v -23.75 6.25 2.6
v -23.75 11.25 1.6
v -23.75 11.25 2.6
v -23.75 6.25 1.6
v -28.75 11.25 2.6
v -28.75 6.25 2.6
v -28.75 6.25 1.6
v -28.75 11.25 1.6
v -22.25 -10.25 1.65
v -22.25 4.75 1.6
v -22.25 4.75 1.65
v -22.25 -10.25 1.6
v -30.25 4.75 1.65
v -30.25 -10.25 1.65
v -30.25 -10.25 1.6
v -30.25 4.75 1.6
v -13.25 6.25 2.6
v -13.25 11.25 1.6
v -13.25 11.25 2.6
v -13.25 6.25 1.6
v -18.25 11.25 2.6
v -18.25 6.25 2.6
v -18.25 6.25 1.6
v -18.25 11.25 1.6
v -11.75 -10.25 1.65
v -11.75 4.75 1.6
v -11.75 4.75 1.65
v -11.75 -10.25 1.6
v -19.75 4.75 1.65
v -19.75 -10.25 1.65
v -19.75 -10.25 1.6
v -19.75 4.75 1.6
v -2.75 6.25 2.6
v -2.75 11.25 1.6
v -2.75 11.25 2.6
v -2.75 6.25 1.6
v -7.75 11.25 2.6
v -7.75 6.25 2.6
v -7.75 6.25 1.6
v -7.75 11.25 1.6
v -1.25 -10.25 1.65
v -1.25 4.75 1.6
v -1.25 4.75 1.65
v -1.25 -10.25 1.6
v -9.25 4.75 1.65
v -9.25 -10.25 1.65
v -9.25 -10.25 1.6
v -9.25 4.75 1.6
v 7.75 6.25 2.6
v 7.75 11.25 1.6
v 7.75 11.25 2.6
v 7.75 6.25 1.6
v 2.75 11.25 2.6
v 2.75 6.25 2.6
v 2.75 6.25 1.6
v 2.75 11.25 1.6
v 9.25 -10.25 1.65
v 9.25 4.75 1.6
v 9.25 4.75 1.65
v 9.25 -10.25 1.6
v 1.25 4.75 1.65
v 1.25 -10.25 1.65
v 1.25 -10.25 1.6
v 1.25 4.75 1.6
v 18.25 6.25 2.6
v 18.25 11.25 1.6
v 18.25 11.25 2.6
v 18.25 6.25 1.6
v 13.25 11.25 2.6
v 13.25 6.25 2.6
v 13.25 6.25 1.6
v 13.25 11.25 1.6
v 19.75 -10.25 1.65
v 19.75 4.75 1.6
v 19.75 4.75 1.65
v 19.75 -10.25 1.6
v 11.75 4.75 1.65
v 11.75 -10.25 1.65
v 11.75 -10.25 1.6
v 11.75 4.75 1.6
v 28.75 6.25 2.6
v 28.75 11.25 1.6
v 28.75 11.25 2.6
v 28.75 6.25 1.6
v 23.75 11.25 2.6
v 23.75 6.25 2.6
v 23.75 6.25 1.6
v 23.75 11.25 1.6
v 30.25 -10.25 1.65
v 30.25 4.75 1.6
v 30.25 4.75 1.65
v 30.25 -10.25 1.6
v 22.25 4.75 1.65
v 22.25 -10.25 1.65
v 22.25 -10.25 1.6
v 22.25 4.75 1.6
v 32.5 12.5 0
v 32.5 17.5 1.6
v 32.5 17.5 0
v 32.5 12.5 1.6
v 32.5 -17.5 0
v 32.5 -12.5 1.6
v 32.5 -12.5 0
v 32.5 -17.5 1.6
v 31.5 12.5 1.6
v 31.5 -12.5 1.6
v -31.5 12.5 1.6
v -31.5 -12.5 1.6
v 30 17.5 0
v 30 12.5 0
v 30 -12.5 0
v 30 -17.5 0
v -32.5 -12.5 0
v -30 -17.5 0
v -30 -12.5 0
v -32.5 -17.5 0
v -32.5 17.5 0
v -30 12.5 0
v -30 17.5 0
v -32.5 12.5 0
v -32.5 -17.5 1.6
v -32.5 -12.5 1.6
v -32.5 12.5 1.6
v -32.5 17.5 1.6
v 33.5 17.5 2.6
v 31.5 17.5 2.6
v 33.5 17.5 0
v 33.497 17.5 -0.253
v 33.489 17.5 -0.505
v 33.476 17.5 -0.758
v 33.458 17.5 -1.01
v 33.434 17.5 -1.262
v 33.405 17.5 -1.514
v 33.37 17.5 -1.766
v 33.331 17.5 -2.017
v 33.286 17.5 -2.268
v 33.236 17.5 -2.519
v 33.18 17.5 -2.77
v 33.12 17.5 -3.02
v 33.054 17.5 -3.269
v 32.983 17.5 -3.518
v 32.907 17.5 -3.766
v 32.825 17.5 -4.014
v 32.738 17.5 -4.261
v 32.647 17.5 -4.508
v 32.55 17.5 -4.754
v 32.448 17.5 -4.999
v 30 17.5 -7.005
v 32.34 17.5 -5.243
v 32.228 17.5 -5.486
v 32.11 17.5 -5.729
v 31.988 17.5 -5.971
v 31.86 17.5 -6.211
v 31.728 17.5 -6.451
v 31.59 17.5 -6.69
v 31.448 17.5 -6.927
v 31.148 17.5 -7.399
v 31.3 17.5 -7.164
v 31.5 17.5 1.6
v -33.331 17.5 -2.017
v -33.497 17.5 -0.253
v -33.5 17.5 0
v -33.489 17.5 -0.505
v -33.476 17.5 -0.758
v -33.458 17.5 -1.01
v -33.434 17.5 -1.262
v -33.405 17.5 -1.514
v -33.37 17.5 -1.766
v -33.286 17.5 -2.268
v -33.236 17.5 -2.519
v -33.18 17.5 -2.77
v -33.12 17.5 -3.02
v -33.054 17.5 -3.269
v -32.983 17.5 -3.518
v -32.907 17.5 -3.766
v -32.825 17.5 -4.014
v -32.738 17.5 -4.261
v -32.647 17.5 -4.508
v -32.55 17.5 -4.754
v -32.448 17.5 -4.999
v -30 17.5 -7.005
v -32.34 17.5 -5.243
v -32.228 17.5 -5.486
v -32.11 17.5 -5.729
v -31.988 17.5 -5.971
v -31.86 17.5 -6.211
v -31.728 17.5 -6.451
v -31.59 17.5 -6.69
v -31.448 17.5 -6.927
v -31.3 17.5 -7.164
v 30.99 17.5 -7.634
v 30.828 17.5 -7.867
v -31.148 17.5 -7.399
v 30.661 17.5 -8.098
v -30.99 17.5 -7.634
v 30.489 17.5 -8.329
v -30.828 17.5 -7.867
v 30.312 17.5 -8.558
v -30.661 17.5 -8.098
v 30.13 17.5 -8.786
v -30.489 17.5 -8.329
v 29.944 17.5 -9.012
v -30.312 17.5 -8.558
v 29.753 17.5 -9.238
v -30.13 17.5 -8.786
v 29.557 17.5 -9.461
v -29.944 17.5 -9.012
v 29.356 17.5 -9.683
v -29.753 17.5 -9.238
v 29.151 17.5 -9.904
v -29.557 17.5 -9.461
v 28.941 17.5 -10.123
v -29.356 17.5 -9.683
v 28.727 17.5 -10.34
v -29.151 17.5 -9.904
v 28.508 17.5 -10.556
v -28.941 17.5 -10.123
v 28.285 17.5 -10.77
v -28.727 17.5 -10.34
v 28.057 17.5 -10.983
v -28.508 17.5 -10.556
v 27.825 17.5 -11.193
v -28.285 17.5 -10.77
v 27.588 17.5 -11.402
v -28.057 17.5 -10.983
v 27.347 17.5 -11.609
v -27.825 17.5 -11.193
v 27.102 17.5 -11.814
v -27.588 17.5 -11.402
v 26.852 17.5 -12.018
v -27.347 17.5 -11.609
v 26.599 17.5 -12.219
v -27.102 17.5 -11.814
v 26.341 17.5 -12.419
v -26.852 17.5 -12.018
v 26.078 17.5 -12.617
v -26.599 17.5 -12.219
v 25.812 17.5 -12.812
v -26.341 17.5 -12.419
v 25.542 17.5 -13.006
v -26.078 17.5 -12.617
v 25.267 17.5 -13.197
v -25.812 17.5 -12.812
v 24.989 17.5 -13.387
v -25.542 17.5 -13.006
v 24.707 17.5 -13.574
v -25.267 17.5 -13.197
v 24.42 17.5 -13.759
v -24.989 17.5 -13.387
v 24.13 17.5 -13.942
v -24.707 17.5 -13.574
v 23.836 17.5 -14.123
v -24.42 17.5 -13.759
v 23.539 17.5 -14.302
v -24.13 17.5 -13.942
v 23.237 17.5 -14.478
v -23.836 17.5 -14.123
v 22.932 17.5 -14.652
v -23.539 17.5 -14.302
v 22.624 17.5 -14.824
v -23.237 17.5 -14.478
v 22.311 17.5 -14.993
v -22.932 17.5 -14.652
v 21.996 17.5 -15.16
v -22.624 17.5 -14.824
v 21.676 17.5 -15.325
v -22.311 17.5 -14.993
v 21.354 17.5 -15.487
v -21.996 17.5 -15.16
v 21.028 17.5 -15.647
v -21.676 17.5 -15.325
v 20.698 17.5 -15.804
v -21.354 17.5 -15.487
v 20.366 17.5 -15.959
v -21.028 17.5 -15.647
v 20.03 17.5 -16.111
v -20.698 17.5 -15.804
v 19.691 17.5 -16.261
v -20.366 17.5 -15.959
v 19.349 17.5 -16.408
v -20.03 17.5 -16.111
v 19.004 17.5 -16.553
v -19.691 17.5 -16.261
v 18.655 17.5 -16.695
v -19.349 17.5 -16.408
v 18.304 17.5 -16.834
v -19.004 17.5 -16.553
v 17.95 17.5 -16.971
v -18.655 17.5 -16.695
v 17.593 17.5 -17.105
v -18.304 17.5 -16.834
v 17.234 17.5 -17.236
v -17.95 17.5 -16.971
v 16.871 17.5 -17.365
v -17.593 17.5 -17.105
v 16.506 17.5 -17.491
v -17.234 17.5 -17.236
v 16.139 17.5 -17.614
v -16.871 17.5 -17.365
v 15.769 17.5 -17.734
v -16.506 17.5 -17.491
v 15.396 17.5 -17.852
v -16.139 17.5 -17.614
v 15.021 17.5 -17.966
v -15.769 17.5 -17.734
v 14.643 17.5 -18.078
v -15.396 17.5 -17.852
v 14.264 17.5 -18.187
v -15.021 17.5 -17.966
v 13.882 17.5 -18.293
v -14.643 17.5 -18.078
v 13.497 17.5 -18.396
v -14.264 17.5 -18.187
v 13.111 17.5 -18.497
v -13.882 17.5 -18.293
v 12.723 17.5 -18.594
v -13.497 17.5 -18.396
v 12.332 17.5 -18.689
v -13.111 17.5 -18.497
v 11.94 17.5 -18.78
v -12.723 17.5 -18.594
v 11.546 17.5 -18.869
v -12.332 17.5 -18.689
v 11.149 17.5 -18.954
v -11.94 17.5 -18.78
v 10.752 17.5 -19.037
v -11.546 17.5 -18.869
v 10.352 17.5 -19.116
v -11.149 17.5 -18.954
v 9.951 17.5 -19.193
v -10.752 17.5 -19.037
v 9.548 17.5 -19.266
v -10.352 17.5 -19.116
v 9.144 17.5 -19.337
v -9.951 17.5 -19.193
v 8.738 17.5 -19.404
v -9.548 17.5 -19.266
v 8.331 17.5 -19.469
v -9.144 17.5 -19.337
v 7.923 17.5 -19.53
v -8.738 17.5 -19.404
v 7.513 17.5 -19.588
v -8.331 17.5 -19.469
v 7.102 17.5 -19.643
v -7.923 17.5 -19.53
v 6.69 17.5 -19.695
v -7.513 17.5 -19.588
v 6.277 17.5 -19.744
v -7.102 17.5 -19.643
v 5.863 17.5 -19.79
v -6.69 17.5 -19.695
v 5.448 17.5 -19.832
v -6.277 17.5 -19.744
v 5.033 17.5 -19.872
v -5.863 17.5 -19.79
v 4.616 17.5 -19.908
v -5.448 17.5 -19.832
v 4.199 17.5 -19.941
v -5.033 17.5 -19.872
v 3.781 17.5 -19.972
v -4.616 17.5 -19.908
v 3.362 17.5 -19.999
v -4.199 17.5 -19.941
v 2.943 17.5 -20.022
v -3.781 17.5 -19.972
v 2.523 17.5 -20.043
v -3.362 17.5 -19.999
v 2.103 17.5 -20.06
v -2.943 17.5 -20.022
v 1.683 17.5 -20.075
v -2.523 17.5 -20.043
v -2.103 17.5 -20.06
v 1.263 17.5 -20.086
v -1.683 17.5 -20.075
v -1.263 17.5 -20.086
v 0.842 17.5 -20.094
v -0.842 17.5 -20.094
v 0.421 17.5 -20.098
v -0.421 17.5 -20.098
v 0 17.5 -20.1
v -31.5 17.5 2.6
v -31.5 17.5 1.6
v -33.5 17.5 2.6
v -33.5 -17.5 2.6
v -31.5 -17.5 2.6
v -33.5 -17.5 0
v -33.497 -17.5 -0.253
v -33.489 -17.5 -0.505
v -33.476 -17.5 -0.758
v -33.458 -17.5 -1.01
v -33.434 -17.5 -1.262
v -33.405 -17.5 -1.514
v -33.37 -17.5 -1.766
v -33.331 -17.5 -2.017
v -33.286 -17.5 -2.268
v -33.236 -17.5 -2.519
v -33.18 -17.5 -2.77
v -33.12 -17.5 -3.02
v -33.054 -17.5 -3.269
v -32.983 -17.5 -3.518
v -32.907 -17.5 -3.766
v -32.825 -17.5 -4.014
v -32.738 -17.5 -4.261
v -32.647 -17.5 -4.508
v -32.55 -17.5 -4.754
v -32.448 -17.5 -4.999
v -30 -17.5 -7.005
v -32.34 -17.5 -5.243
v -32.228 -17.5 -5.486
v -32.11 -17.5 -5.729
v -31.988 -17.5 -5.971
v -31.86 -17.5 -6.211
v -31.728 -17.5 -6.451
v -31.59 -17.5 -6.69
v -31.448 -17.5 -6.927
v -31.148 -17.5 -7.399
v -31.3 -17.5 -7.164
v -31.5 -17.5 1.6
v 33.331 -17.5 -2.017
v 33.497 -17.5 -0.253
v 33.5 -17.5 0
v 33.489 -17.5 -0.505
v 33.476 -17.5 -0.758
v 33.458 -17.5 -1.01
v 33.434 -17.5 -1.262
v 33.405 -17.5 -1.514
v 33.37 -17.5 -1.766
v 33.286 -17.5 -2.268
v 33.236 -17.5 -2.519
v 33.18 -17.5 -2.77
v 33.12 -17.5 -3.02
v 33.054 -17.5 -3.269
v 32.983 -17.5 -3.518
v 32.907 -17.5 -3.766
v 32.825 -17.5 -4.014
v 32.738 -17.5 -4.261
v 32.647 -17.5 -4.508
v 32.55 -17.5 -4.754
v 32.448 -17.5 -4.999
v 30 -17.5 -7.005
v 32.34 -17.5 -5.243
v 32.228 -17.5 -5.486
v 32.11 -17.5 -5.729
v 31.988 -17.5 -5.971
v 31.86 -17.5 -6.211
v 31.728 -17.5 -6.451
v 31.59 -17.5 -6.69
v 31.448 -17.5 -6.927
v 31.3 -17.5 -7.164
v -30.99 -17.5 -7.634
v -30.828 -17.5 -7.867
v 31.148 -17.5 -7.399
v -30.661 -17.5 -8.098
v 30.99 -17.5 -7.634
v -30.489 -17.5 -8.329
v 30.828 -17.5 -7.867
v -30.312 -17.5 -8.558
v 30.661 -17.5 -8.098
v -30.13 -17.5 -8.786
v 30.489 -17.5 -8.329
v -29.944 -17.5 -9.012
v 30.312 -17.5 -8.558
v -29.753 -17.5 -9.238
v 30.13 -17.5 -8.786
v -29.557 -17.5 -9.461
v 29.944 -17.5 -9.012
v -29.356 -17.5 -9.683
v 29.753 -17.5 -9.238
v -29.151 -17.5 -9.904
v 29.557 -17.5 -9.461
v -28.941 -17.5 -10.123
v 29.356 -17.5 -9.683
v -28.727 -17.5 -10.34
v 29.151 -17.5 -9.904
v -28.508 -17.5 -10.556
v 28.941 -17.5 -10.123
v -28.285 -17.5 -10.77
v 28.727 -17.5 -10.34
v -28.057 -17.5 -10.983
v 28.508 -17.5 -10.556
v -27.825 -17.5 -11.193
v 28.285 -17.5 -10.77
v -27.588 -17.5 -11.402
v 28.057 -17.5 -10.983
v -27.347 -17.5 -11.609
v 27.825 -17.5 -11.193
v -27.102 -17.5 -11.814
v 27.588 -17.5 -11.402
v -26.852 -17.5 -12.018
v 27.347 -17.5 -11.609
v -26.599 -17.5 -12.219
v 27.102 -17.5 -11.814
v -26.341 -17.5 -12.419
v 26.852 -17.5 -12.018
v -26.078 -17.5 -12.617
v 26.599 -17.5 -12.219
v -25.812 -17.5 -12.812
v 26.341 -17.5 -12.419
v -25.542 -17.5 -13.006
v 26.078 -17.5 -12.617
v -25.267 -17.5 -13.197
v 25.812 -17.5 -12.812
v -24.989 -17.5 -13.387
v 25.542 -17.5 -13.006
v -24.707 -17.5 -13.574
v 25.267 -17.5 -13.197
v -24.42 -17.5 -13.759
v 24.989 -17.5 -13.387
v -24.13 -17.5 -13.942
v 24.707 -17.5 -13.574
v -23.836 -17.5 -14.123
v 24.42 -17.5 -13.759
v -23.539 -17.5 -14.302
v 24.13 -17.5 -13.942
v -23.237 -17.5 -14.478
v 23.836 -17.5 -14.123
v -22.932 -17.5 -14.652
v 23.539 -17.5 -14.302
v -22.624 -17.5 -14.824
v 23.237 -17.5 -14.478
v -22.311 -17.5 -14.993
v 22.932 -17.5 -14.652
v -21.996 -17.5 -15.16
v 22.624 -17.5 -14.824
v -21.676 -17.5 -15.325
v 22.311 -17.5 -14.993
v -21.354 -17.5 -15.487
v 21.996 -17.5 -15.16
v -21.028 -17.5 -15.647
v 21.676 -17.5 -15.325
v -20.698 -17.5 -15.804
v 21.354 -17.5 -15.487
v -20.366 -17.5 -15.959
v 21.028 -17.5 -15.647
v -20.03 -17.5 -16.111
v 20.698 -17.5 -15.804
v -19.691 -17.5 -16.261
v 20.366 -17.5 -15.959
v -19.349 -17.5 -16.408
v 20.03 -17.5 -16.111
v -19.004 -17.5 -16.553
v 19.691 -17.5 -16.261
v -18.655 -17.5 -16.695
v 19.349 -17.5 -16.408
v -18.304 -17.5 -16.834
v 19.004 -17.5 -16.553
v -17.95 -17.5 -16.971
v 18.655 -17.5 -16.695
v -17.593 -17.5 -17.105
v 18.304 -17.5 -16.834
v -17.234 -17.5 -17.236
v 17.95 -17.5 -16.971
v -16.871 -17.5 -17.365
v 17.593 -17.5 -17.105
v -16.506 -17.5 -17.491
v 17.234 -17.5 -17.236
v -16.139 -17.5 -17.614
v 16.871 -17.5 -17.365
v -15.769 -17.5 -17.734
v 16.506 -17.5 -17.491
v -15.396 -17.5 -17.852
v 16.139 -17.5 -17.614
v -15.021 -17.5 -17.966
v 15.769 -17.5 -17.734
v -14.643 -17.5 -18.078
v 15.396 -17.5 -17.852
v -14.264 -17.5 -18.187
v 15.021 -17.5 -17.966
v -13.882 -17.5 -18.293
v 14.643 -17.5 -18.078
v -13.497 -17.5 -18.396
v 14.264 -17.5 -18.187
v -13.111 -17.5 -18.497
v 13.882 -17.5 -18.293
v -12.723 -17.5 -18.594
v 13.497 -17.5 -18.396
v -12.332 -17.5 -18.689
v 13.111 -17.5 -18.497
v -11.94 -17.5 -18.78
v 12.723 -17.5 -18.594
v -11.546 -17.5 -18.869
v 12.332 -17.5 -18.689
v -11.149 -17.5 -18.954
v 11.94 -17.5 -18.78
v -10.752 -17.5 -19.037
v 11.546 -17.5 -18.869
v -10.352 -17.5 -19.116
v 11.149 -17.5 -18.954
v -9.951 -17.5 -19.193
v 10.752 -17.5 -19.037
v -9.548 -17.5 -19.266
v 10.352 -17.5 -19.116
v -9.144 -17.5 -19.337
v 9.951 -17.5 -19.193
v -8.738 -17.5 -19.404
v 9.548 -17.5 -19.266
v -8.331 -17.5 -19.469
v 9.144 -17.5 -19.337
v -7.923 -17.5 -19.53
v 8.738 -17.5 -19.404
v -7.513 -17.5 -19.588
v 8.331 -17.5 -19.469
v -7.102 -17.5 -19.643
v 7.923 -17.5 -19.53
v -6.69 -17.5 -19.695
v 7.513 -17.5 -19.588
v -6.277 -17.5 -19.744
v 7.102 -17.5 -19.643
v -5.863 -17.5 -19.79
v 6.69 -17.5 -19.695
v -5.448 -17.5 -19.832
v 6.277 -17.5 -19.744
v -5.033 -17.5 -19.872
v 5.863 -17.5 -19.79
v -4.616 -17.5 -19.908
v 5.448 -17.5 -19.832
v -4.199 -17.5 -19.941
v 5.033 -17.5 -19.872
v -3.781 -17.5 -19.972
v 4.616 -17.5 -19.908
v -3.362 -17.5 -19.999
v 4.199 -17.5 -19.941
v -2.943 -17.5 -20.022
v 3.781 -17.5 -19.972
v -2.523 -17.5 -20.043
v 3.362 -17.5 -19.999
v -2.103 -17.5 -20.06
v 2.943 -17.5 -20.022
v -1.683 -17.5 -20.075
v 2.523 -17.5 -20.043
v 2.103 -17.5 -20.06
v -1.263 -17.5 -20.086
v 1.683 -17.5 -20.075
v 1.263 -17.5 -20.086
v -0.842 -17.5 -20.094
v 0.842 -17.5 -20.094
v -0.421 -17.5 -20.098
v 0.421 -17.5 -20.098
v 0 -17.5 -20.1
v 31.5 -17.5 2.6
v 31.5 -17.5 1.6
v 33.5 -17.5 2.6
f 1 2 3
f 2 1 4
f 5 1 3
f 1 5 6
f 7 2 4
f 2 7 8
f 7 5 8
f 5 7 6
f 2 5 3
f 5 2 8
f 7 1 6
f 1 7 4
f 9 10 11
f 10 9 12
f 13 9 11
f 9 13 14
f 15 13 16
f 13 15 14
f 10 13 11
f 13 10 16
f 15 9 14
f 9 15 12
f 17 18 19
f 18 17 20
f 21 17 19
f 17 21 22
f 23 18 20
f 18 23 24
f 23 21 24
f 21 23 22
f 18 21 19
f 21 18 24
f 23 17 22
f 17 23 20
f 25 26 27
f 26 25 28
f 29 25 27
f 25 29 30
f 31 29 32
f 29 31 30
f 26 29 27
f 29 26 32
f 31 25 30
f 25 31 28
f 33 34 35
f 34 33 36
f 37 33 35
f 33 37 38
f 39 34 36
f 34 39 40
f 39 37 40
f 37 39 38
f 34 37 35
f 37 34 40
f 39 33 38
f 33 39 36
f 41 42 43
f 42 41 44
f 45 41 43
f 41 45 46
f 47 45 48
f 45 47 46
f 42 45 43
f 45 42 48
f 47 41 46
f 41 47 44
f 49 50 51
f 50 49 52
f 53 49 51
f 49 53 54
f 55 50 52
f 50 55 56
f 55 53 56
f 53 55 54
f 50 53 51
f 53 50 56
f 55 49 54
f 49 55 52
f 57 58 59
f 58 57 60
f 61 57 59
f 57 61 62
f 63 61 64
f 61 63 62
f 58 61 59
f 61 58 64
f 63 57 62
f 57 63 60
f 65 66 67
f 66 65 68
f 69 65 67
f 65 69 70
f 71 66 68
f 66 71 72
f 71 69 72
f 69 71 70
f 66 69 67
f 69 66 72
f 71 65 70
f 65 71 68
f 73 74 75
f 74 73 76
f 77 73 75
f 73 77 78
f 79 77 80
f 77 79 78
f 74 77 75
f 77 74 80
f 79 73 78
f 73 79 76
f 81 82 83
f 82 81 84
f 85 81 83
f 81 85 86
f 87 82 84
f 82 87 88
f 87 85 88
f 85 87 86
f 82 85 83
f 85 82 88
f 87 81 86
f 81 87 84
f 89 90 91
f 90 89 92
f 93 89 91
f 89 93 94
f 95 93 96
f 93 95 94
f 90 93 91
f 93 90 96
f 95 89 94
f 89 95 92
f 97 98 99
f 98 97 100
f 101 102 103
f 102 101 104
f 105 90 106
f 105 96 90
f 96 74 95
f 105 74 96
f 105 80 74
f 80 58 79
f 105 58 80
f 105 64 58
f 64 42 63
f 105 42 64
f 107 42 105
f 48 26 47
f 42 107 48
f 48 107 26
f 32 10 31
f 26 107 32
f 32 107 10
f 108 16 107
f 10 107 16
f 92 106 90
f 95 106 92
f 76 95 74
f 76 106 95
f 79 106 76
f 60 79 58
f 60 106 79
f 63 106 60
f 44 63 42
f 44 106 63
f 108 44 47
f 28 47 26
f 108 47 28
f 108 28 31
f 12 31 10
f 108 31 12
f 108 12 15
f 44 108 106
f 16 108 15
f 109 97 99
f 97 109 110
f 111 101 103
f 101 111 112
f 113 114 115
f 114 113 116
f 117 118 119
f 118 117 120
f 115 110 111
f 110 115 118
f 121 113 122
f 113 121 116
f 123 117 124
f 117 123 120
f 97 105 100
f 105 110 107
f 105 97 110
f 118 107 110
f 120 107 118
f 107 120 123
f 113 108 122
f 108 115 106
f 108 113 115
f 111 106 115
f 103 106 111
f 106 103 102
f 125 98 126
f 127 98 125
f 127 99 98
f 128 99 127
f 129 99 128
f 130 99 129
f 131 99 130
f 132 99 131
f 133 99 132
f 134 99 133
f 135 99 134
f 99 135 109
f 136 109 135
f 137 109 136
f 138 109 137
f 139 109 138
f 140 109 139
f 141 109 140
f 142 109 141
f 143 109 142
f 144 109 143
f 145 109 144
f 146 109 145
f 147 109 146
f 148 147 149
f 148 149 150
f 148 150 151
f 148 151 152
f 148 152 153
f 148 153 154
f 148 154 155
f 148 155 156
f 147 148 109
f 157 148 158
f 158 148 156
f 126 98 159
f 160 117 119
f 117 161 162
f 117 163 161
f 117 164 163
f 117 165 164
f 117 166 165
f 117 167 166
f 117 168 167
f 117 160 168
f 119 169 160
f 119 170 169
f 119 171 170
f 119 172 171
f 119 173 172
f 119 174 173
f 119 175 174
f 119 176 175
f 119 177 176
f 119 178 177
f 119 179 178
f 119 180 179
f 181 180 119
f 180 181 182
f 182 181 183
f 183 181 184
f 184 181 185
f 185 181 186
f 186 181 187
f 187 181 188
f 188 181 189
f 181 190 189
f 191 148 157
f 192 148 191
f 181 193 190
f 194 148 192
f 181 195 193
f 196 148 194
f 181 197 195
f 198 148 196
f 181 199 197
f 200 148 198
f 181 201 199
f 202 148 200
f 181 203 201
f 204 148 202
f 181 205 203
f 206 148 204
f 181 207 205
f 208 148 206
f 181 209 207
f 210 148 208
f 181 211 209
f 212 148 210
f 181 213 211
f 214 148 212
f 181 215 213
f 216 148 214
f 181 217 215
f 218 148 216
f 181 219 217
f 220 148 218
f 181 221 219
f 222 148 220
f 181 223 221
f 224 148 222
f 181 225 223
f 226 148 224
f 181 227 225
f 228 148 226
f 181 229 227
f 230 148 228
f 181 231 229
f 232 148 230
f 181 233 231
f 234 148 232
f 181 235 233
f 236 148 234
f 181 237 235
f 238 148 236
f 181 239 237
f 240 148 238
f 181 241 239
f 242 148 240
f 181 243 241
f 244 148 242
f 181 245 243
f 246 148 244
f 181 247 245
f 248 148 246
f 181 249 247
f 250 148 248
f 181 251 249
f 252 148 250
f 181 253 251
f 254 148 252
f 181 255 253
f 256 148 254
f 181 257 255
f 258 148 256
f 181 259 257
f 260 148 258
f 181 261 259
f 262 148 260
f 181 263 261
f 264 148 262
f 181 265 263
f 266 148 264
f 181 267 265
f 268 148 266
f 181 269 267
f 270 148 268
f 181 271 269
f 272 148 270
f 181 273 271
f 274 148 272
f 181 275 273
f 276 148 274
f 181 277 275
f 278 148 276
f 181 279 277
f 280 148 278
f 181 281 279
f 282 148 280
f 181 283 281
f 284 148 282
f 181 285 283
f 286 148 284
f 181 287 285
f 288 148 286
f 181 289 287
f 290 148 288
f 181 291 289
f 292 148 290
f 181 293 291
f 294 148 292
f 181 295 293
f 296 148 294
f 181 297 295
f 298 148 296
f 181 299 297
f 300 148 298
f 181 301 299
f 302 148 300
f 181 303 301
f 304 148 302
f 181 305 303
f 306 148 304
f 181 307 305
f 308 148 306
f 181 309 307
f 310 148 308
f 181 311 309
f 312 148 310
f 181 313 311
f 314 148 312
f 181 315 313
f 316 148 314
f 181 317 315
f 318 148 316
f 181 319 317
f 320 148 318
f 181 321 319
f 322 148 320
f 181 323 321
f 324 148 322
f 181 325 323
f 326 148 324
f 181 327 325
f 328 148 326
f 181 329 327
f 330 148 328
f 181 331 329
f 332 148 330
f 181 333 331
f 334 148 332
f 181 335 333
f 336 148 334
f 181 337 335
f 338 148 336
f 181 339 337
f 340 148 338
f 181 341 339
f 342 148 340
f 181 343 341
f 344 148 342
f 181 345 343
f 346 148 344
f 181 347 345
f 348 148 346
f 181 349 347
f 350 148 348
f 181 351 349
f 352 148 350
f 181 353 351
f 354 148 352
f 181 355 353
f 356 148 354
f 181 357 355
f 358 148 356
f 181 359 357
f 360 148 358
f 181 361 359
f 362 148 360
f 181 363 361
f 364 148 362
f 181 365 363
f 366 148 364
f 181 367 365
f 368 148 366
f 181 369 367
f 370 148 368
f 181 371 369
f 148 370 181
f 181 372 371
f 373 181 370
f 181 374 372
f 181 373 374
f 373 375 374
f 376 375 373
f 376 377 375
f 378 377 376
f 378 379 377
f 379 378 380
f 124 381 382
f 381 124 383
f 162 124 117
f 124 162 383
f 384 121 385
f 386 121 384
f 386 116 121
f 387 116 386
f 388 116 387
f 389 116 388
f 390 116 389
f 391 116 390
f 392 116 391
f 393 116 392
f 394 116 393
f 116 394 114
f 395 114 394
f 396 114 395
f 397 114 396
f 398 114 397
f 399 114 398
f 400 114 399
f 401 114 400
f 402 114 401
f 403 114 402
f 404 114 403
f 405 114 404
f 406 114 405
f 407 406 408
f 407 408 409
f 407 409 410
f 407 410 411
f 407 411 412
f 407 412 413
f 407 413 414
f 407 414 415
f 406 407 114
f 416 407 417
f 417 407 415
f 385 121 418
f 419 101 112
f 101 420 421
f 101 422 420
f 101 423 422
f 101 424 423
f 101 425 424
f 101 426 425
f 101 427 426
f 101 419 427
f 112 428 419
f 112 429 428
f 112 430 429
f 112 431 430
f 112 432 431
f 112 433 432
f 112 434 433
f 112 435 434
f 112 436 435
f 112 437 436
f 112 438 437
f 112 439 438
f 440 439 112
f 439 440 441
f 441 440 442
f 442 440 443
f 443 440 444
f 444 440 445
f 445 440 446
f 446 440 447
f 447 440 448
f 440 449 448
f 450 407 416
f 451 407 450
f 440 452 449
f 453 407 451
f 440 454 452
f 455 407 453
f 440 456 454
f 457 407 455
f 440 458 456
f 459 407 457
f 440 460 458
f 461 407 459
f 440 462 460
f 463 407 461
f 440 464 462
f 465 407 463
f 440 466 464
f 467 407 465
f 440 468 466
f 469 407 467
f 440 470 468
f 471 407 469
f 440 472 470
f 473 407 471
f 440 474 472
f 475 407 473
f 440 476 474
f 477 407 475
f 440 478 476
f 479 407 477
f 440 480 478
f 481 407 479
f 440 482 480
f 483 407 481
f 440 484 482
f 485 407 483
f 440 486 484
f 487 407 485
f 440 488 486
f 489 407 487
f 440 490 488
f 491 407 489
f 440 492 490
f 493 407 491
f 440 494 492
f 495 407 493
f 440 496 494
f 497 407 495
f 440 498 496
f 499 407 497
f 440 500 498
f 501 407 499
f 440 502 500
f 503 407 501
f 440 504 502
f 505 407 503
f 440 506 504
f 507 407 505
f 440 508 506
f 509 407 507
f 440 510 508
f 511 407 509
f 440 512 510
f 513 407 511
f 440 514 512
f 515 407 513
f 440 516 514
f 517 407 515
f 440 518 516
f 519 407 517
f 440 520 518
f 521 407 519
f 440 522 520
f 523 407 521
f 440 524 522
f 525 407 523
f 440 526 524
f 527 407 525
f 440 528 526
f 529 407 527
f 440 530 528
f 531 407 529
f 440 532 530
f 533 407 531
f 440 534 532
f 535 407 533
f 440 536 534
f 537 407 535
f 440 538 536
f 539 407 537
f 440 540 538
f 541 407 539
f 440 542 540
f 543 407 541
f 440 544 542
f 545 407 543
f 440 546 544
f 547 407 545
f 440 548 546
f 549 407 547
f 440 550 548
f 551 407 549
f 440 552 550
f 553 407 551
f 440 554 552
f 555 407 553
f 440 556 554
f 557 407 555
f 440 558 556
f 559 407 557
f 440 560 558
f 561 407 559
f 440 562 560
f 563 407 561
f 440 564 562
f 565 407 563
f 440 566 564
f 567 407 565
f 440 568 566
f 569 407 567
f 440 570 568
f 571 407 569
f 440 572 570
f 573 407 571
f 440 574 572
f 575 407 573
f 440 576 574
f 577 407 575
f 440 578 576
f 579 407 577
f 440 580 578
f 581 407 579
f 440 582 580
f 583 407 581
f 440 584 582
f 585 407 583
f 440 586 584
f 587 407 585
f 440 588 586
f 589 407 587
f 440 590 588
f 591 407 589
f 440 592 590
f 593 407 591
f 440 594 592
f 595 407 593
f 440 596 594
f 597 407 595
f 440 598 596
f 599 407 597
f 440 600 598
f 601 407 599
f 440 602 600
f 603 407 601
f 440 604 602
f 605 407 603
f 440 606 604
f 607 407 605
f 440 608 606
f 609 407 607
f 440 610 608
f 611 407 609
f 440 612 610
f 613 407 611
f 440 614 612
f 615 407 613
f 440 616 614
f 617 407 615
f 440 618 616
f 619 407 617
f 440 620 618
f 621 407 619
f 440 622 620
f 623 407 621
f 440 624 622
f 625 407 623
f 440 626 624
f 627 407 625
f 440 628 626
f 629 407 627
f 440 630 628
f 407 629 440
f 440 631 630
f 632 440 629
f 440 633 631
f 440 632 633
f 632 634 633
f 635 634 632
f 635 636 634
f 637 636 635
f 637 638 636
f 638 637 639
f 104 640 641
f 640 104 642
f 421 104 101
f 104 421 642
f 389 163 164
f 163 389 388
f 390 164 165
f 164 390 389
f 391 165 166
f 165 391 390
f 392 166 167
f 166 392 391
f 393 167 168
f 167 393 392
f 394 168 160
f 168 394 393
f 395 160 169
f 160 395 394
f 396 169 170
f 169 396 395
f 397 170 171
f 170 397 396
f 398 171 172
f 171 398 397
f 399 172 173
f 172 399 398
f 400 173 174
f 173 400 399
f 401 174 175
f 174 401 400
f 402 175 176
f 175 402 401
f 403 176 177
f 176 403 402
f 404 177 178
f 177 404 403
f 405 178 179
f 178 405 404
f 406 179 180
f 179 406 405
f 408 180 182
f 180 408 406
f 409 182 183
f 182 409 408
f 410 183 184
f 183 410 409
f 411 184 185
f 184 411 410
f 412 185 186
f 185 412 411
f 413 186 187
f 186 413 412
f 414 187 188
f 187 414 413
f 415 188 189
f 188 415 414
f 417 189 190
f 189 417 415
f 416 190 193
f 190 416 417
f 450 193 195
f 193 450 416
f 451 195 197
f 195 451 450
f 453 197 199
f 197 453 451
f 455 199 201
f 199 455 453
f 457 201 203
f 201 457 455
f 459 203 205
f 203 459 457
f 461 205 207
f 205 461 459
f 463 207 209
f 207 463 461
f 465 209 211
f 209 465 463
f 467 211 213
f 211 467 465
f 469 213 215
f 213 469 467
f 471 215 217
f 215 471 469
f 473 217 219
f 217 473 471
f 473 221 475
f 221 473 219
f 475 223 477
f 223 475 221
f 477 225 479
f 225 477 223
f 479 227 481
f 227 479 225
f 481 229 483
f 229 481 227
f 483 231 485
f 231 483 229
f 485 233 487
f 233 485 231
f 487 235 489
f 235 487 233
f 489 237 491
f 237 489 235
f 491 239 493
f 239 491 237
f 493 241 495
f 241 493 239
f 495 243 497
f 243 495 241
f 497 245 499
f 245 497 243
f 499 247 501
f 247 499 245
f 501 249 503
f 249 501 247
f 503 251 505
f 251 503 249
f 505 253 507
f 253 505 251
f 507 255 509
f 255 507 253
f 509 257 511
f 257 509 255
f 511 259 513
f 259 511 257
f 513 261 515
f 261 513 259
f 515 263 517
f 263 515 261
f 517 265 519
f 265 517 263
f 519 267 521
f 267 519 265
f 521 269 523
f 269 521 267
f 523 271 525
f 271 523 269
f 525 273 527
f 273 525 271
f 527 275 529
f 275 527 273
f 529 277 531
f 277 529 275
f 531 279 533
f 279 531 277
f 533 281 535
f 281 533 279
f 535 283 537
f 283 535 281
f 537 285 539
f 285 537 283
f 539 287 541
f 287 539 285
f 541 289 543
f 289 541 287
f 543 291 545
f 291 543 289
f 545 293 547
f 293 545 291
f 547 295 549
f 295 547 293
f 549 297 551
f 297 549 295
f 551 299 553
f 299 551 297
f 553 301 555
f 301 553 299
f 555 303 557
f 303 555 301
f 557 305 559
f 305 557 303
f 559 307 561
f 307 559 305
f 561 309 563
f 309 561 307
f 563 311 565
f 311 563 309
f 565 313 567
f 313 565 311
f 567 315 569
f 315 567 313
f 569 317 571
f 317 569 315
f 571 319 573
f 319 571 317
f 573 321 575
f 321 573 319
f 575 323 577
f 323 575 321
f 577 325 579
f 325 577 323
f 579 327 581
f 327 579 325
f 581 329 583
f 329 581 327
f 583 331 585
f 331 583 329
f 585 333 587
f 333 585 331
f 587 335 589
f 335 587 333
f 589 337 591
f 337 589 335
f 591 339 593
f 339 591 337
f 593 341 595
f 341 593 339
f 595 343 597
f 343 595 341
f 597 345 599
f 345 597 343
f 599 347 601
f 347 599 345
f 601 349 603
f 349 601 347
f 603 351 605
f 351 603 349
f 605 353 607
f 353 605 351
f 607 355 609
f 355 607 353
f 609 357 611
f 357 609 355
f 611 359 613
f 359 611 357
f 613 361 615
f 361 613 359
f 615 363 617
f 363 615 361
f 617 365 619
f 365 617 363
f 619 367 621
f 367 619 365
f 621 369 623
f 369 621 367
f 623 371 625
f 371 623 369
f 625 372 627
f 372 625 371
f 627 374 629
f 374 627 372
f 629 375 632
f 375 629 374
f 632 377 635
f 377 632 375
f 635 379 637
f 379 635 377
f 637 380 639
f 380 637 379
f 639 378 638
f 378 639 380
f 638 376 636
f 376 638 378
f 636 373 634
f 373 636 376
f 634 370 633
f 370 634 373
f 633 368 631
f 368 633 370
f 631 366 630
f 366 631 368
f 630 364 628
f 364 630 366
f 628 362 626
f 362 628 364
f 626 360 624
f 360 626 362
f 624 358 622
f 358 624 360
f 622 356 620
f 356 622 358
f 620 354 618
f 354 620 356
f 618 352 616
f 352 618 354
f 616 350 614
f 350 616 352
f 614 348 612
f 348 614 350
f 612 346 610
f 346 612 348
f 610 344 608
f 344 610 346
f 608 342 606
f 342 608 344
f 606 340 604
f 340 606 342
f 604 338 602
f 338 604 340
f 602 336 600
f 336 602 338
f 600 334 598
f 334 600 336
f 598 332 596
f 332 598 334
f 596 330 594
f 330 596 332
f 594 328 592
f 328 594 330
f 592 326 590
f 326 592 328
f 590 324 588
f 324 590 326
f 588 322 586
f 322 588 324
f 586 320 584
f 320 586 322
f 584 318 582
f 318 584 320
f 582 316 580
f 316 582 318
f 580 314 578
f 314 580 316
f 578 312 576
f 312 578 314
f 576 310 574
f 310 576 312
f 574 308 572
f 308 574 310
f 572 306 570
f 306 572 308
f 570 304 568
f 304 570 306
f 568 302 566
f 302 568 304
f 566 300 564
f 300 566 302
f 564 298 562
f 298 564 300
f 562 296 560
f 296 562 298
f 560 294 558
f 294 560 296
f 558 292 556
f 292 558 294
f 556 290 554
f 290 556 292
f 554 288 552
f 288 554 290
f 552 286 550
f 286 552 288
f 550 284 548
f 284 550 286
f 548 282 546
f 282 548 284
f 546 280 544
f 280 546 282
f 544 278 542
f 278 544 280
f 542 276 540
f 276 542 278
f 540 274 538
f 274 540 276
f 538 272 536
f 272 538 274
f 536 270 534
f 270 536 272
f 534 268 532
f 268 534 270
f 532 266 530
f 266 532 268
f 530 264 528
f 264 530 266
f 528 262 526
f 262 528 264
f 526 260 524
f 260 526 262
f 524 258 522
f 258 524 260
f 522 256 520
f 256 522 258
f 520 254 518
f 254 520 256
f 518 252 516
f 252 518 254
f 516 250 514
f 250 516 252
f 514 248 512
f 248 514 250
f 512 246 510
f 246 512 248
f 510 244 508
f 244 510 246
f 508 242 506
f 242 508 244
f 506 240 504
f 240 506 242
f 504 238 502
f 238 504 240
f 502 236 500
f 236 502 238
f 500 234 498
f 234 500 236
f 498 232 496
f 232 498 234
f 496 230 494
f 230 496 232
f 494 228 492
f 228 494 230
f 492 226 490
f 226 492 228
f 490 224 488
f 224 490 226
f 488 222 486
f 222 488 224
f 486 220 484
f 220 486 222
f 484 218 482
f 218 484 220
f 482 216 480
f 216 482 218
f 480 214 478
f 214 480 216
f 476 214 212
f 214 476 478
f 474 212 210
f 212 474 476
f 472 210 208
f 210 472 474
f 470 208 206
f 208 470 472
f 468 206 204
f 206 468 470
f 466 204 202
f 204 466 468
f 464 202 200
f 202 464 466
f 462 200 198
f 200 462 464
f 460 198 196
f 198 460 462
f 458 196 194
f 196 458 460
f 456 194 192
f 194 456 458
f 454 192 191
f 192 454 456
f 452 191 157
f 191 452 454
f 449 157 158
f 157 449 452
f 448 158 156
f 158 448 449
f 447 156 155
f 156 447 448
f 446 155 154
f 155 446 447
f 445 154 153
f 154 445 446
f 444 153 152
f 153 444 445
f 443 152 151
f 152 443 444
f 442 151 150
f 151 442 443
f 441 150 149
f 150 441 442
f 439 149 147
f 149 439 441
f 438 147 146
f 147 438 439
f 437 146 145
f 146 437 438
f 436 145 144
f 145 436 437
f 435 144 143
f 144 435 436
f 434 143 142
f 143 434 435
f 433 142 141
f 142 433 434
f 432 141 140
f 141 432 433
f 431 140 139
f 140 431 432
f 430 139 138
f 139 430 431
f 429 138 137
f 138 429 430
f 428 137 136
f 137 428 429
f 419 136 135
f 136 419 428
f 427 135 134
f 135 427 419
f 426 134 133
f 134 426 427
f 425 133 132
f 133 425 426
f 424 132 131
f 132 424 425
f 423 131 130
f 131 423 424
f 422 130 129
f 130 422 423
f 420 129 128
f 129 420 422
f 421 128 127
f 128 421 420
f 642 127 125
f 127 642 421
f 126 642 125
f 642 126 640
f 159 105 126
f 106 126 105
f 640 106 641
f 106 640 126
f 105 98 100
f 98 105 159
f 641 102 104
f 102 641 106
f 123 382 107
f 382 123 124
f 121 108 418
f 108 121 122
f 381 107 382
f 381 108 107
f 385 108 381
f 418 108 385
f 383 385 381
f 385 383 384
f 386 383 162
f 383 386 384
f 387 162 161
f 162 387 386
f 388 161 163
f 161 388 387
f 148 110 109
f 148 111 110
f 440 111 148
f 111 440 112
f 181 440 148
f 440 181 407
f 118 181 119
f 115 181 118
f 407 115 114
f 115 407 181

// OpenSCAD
pcb_width = 65;
pcb_height = 25;
pcb_thick = 1.6;
plastic_min_width = 1;
curve_aspect_ratio = 0.6;

keepout_offset = 2.5;
keepout_height = 7;

pcb_color = [0.1, 0.1, 0.1];
plastic_color = [0, 0.7, 1];

module led() {
	color([1, 1, 1]) translate([0, 0, 0.5]) cube([5, 5, 1], center = true);
	color([0.9, 0.9, 0.9]) translate([0, 0, 0.6]) circle(2, $fn=100);
}

module touchpad() {
	color([0, 0, 0]) translate([]) cube([8, 15, 0.1], center = true);
}

module pcb() {
	translate([0, 0, pcb_thick/2])
		color(pcb_color) cube([pcb_width, pcb_height, pcb_thick], center = true);
//	translate([0, 0, -keepout_height/2])
//		color([1, 0.8, 0.5])
//			cube([pcb_width - keepout_offset * 2, pcb_height, keepout_height], center = true);
	for(i = [0 : 5]) {
		translate([6.25 - pcb_width / 2 + i * 10.5, 0, pcb_thick]) {
			translate([0, 21.25 - pcb_height / 2, 0]) {
				led();
			}
			translate([0, 9.75 - pcb_height / 2, 0]) {
				touchpad();
			}
		}
	}
}
pcb();

module lip() {
	polygon(points=[
		[pcb_width / 2, 0],
		[pcb_width / 2 + plastic_min_width, 0],
		[pcb_width / 2 + plastic_min_width, pcb_thick + plastic_min_width],
		[pcb_width / 2 - plastic_min_width, pcb_thick + plastic_min_width],
		[pcb_width / 2 - plastic_min_width, pcb_thick],
		[pcb_width / 2, pcb_thick],
	]);
//	polygon([[0,0],[100,0],[130,50],[30,50]]);
// polygon([[0,0],[100,0],[130,50],[30,50]],[[3,2,1,0]]);
// polygon([[0,0],[100,0],[130,50],[30,50]],[[1,0,3,2]]);

}

//color(plastic_color) rotate([90, 0, 0]) lip();

module plastic() {
	difference() {
		rotate([90, 0, 0]) {
			linear_extrude(height = pcb_height + 10, center = true) {
				union() {
					difference() {
						scale([1,curve_aspect_ratio])
							circle(pcb_width / 2 + plastic_min_width, $fn=500);
						translate([-pcb_width / 2 - plastic_min_width,0])
							scale(pcb_width + plastic_min_width*2) 
								square();
					}
					lip();
					mirror ([1,0,0]) lip();
				}
			}
		}
	translate([0, 0, -keepout_height/2])
		cube([pcb_width - keepout_offset * 2, 1000, keepout_height + 0.01], center = true);	
	}
}

color(plastic_color) plastic();
